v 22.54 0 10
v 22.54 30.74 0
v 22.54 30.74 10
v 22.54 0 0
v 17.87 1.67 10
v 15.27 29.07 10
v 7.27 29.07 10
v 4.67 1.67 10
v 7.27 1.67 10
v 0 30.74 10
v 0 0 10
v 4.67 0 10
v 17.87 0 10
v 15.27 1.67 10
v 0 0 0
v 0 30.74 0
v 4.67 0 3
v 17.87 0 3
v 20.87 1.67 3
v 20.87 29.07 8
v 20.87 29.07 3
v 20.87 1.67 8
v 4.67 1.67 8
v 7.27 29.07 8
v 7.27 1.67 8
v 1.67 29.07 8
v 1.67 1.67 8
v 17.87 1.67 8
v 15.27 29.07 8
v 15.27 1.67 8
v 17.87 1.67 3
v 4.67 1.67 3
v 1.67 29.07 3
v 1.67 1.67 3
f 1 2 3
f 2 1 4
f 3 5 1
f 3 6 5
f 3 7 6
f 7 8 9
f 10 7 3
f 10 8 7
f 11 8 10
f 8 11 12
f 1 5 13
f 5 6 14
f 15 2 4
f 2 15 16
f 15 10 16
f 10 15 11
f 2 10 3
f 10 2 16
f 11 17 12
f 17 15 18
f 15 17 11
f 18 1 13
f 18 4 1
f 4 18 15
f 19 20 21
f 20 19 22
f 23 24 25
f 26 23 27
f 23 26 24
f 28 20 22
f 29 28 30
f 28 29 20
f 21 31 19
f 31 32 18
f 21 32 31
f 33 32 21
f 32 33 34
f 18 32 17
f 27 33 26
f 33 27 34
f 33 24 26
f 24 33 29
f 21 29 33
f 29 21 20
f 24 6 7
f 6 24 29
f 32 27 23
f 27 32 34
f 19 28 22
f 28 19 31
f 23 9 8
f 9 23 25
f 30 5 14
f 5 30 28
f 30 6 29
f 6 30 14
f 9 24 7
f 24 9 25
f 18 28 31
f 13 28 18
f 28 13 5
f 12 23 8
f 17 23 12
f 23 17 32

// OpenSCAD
/*
 * Replacement Clamp Pads Part B
 *
 * Author: Pavel Rampas
 * Version: 1.0.0 (Changelog is at the bottom)
 * License: CC BY-SA 4.0 [https://creativecommons.org/licenses/by-sa/4.0/]
 * Link: https://github.com/pavelrampas/openscad-models
 *
 * OpenSCAD version: 2021.01
 *
 * Instructions:
 * Set up parameters, render and print.
 *
 * Height is layer.
 * Thickness is perimeter.
 */

// Parameters
//------------------------------------------------------------------------------

$fn = $preview ? 15 : 90;

clampHeadWidth = 27.4; // small 27.4, large 32
clampHeadDepth = 19.2; // small 19.2, large 22.4
clampHeadHeight = 5; // small 5, large 6

holeSize = 8; // small 8, large 12

// Parameters that don't need to be changed
//------------------------------------------------------------------------------

thickness = 1.67; // wall thickness
height = 3;

// Code
//------------------------------------------------------------------------------

difference() {
    cube([
        clampHeadDepth + (2 * thickness),
        clampHeadWidth + (2 * thickness),
        clampHeadHeight + height + 2
    ]);
    // clamp head
    translate([thickness, thickness, height]) {
        cube([clampHeadDepth, clampHeadWidth, clampHeadHeight]);
    }
    // hole
    translate([(thickness + clampHeadDepth / 2) - (holeSize / 2), 0, height]) {
        cube([holeSize, clampHeadWidth + thickness, clampHeadHeight + 2]);
    }
    translate([thickness + 3, 0, height]) {
        cube([clampHeadDepth - 6, thickness, clampHeadHeight + 2]);
    }
}

// Functions
//------------------------------------------------------------------------------

// Modules
//------------------------------------------------------------------------------

// Changelog
//------------------------------------------------------------------------------

// [1.0.0]:
// Initial release.
